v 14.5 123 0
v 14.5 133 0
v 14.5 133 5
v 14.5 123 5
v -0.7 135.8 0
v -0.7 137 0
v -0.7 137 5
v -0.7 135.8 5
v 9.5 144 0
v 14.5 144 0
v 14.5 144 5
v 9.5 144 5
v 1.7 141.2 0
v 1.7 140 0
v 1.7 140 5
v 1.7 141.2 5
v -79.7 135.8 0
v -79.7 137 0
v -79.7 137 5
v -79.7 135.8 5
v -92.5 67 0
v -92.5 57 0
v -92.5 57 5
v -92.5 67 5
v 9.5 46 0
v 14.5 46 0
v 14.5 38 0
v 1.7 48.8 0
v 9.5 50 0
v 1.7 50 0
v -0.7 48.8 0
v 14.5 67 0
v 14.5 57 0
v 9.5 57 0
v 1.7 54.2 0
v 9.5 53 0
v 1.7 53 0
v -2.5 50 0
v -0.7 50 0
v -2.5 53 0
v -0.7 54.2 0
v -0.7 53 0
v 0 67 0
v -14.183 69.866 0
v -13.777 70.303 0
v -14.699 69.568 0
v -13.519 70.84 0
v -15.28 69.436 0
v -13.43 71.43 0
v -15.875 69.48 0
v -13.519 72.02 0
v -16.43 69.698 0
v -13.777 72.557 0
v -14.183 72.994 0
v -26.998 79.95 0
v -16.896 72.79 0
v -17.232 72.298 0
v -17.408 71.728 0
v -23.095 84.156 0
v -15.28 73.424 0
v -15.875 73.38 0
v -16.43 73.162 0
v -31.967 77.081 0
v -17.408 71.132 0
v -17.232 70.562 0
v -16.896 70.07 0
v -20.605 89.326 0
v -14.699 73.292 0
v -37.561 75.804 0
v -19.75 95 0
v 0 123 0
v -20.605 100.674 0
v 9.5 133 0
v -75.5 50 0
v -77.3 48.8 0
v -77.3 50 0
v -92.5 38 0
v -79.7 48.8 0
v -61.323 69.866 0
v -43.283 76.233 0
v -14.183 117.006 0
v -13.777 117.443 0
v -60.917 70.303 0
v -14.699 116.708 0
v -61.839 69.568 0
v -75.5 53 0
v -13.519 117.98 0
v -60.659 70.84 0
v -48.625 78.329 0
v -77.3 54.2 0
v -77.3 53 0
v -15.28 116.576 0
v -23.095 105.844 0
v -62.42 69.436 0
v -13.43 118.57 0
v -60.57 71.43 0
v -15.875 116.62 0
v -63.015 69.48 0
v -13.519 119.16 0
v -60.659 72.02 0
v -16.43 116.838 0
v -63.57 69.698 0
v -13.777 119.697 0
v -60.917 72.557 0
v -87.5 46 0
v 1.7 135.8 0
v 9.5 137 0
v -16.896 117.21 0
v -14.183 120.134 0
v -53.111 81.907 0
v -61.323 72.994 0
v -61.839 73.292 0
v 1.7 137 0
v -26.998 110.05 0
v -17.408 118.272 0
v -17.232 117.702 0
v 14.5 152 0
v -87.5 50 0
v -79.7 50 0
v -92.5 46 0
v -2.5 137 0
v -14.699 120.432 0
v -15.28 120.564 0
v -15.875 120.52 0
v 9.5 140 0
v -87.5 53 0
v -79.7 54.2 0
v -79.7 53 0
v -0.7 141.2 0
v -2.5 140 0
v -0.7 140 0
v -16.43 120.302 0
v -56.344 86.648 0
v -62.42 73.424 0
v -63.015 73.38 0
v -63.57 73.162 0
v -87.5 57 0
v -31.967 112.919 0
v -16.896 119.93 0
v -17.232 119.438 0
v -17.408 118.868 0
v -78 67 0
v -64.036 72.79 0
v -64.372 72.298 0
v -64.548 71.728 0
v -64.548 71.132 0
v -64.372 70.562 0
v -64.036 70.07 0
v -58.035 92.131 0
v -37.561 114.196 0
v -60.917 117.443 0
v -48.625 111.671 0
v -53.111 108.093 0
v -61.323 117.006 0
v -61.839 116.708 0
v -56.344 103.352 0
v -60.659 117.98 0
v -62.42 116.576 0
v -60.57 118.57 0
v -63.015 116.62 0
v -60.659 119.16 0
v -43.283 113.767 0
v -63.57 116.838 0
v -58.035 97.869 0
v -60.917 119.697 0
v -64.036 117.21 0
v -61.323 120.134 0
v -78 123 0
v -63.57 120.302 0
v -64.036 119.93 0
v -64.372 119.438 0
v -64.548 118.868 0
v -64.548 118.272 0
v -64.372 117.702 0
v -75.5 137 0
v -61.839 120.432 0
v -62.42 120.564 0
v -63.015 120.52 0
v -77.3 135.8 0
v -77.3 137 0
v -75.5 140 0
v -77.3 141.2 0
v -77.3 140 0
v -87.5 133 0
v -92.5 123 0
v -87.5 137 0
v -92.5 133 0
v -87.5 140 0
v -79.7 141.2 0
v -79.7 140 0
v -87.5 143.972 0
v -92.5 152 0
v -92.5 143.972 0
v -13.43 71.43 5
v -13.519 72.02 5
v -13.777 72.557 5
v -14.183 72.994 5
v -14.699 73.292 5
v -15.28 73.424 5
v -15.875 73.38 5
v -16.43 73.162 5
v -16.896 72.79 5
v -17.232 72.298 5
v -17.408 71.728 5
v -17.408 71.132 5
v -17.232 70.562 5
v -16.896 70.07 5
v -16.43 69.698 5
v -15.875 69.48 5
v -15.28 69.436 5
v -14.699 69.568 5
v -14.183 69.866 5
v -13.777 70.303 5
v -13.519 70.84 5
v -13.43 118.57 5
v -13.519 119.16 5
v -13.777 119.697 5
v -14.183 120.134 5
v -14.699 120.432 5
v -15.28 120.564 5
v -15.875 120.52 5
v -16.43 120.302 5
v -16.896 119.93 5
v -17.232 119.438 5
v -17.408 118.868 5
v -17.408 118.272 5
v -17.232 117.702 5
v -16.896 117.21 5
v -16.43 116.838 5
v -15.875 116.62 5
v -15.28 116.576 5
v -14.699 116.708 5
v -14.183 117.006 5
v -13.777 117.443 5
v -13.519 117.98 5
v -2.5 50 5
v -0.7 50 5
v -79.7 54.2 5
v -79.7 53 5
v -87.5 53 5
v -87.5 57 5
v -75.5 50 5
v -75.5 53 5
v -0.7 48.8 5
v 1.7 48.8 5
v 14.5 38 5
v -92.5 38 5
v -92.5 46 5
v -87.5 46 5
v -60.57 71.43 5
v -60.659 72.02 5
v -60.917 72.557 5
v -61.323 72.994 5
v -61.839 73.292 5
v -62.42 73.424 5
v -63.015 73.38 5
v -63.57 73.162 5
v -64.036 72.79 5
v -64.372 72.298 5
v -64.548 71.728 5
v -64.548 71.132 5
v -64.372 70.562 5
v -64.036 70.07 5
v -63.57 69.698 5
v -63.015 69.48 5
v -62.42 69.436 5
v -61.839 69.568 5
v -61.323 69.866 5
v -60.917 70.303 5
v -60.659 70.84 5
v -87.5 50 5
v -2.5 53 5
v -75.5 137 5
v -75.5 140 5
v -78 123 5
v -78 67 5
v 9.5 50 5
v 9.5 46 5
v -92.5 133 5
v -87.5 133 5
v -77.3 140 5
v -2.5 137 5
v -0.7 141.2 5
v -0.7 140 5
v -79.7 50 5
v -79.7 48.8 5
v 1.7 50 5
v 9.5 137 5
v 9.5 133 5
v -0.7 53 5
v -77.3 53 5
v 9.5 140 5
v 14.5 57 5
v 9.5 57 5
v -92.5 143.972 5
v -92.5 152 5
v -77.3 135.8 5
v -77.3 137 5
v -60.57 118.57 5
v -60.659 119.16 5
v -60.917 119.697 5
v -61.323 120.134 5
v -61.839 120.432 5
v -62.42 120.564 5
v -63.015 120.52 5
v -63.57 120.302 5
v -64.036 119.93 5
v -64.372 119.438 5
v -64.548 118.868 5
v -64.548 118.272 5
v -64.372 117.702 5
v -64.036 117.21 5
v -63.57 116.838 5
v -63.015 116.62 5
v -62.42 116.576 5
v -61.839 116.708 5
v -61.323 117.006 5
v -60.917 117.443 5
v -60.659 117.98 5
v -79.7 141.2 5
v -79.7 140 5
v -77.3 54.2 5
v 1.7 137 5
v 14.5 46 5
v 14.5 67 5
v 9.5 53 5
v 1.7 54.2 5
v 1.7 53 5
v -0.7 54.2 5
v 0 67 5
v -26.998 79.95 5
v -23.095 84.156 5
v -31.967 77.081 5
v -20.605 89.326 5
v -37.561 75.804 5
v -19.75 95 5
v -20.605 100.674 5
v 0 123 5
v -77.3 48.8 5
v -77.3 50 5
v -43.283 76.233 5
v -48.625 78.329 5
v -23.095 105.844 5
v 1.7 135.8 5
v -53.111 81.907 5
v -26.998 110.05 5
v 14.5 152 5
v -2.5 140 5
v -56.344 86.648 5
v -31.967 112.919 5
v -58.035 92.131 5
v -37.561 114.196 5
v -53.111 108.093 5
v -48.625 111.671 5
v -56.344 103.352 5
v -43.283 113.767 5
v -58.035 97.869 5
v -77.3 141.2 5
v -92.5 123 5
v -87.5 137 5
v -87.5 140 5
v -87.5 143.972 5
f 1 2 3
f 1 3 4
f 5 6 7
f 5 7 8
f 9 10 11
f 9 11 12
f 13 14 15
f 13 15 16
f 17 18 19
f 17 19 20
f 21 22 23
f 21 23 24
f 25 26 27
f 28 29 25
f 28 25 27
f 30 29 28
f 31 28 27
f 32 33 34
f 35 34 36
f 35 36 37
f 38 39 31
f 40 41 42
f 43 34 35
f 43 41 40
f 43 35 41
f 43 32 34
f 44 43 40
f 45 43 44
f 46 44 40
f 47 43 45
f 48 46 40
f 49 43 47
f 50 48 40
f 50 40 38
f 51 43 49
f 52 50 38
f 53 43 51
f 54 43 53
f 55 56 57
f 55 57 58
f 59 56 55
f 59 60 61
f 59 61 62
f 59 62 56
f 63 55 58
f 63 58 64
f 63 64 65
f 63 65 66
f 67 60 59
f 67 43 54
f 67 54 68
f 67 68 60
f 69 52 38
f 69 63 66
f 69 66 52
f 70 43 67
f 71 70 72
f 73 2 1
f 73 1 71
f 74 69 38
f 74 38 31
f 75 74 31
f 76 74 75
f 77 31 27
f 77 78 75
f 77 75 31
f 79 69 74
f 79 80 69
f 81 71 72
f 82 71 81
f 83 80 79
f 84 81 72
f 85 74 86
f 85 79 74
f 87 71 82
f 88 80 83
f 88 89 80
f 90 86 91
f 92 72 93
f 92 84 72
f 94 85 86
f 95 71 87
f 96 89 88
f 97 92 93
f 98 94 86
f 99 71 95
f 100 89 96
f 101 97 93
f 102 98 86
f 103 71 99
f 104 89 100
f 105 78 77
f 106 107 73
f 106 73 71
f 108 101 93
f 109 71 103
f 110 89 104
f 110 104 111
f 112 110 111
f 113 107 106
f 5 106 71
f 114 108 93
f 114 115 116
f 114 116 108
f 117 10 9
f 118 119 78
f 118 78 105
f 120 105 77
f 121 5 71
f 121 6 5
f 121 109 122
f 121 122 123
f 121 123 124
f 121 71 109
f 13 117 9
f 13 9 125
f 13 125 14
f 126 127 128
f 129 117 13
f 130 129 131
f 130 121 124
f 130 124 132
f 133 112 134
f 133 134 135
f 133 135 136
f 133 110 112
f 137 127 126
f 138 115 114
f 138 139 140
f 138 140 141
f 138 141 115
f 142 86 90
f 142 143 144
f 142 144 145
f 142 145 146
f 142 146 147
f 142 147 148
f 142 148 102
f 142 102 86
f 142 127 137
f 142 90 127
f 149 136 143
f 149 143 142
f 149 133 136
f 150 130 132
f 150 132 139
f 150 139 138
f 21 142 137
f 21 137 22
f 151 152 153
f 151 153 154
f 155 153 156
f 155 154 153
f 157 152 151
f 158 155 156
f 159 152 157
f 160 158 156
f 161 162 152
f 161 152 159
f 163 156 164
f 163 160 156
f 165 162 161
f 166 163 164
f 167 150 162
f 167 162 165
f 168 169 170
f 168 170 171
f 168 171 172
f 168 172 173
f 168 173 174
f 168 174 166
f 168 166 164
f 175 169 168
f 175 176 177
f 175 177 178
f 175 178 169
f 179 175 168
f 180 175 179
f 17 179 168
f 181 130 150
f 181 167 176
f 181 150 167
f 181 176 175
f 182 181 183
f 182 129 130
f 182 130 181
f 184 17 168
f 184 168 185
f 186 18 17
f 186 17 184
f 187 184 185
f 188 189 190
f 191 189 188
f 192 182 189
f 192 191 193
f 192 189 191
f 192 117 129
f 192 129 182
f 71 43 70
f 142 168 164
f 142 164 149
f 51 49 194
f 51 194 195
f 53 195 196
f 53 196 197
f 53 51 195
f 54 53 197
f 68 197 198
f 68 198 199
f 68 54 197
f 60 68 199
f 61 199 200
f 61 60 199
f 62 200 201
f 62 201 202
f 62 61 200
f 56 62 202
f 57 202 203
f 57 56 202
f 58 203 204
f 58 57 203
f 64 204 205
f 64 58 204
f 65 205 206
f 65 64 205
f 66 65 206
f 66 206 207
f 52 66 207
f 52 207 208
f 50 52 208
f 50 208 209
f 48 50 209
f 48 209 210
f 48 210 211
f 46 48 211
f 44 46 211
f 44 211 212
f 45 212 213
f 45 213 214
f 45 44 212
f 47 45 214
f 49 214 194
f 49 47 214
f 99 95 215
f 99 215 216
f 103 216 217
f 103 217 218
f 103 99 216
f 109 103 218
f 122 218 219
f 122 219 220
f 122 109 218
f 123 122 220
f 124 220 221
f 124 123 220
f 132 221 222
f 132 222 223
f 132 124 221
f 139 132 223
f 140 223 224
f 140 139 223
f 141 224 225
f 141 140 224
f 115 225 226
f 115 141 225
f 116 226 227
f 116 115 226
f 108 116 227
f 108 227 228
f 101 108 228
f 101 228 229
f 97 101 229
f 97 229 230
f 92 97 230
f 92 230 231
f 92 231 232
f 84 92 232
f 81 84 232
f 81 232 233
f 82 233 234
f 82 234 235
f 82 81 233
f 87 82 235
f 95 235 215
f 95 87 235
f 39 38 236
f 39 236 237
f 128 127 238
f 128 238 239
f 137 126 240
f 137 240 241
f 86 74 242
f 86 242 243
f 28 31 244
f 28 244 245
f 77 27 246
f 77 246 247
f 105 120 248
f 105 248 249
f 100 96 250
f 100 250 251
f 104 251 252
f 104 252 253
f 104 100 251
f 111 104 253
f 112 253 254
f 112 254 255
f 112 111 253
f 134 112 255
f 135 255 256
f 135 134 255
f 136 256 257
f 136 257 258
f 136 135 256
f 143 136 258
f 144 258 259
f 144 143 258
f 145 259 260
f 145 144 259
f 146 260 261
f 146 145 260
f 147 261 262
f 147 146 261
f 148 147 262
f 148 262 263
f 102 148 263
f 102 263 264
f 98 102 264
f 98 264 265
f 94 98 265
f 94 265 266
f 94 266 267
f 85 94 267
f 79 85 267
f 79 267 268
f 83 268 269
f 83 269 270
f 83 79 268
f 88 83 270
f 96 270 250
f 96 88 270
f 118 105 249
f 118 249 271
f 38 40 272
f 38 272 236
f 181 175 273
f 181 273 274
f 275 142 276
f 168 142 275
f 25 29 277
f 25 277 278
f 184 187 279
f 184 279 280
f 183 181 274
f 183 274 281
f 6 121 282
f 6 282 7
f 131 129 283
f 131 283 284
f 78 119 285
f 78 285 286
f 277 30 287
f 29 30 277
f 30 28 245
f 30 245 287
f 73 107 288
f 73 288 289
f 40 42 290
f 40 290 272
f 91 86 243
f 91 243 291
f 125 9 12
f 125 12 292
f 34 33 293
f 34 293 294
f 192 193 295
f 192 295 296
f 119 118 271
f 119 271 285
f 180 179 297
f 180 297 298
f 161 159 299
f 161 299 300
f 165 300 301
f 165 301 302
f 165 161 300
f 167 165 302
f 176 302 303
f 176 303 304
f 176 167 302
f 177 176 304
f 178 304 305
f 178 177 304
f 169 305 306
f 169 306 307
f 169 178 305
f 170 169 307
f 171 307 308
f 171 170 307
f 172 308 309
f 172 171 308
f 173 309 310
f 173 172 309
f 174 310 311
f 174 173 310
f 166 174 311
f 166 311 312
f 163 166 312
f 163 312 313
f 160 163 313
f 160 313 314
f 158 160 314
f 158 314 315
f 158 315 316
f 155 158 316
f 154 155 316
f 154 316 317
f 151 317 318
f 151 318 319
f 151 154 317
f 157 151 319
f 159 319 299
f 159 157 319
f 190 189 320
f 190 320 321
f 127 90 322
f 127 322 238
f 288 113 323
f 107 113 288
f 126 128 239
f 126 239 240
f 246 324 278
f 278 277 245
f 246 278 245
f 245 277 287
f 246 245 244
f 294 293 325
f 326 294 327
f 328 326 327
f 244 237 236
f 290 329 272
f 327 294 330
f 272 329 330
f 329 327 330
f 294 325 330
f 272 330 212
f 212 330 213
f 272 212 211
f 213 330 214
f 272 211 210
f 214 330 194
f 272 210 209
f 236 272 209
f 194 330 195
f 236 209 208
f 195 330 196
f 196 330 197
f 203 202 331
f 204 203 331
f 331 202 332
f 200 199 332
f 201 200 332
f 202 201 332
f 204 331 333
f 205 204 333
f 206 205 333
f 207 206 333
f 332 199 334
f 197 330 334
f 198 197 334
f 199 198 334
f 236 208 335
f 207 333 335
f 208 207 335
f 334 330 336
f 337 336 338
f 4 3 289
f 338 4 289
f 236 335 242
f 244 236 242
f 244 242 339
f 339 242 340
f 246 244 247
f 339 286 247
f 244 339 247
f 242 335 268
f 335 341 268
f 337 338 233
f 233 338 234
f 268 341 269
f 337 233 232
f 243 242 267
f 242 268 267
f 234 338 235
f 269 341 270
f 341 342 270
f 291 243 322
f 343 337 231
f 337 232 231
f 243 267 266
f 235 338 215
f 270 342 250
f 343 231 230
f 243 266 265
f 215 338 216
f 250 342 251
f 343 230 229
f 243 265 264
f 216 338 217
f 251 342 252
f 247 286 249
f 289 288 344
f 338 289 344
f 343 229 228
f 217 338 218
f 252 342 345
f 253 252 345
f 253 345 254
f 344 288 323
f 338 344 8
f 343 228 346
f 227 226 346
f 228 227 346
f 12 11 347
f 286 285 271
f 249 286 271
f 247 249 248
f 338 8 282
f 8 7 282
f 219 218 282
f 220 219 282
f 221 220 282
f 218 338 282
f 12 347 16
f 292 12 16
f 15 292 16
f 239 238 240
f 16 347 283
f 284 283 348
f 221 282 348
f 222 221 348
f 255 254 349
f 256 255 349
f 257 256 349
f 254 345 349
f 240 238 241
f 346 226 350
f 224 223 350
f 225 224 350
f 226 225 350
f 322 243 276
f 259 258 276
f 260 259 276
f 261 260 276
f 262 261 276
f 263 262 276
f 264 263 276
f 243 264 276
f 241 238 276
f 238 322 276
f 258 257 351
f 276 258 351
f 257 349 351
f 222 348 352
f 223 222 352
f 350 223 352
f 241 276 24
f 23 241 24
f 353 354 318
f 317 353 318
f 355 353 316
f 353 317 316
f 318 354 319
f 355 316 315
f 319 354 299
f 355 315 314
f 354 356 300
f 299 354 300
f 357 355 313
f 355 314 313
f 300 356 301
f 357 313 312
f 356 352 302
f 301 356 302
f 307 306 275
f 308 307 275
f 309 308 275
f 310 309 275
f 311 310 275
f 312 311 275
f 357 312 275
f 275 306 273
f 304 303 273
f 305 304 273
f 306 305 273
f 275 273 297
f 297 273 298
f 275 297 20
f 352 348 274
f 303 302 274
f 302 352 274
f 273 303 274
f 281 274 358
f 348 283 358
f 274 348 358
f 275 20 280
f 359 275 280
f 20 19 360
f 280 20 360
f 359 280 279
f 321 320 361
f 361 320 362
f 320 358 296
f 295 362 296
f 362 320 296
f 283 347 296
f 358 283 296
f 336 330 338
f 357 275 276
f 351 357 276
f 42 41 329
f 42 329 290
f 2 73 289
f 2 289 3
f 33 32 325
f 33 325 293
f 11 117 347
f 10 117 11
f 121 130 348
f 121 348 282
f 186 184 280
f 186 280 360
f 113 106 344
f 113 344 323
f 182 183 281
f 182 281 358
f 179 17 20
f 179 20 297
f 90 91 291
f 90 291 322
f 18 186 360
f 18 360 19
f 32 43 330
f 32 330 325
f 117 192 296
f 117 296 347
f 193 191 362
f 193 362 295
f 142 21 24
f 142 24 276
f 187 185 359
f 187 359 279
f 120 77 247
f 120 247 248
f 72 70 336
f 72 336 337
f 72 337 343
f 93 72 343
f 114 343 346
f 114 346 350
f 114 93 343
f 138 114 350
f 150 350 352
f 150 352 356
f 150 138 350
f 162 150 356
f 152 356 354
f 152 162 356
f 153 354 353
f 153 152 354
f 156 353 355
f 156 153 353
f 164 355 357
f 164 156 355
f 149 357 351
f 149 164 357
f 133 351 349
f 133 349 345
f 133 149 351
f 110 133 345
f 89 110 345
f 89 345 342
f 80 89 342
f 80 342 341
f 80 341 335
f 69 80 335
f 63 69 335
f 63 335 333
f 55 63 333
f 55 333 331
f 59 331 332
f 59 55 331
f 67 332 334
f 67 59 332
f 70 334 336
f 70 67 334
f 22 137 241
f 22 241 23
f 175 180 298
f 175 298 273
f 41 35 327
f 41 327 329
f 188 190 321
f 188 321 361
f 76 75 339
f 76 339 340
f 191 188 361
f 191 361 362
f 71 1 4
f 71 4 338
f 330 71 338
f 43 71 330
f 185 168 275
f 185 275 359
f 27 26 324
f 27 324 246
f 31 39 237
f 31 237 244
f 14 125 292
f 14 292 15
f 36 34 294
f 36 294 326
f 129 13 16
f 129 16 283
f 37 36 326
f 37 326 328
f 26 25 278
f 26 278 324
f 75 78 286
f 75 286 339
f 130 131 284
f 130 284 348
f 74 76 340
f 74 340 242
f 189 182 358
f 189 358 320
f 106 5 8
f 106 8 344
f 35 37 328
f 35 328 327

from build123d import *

# Parameters (mm, degrees)
MODEL_R                  = 2
MODEL_R_2                = 19.25
RESSALTO_EXTRUS_O1_DEPTH = 5


with BuildPart() as part:
    # Model → Ressalto-extrusão1 (new body)
    with BuildSketch(Plane.XY):
        Polygon((-87.499906276, 136.999930927), (-79.699992019, 136.999930927), (-79.699992019, 135.799931225), (-77.299992019, 135.799931225), (-77.299992019, 136.999930927), (-75.499992019, 136.999930927), (-75.499992019, 139.999946471), (-77.299992019, 139.999946471), (-77.299992019, 141.199946173), (-79.699992019, 141.199946173), (-79.699992019, 139.999946471), (-87.499906276, 139.999946471), (-87.499906276, 143.971527937), (-92.499906103, 143.971527937), (-92.499906103, 151.99992515), (14.500094446, 151.99992515), (14.500094446, 143.999926549), (9.500094619, 143.999926549), (9.500094619, 139.999946471), (1.700033295, 139.999946471), (1.700033295, 141.199946173), (-0.699966705, 141.199946173), (-0.699966705, 139.999946471), (-2.499966705, 139.999946471), (-2.499966705, 136.999930927), (-0.699966705, 136.999930927), (-0.699966705, 135.799931225), (1.700033295, 135.799931225), (1.700033295, 136.999930927), (9.500094619, 136.999930927), (9.500094619, 133.000010759), (14.500094446, 133.000010759), (14.500094446, 123.000010744), (3.1755e-05, 123.000010744), (3.1755e-05, 66.999892416), (14.500094446, 66.999892416), (14.500094446, 56.999892401), (9.500094619, 56.999892401), (9.500094619, 52.999972233), (1.700033295, 52.999972233), (1.700033295, 54.199971935), (-0.699966705, 54.199971935), (-0.699966705, 52.999972233), (-2.499966705, 52.999972233), (-2.499966705, 50.000008094), (-0.699966705, 50.000008094), (-0.699966705, 48.799928912), (1.700033295, 48.799928912), (1.700033295, 50.000008094), (9.500094619, 50.000008094), (9.500094619, 46.000008447), (14.500094446, 46.000008447), (14.500094446, 38.000009846), (-92.499906103, 38.000009846), (-92.499906103, 46.000008447), (-87.499906276, 46.000008447), (-87.499906276, 49.999928614), (-79.699992019, 49.999928614), (-79.699992019, 48.799928912), (-77.299992019, 48.799928912), (-77.299992019, 49.999928614), (-75.499992019, 49.999928614), (-75.499992019, 52.999972233), (-77.299992019, 52.999972233), (-77.299992019, 54.199971935), (-79.699992019, 54.199971935), (-79.699992019, 52.999972233), (-87.499906276, 52.999972233), (-87.499906276, 56.999892401), (-92.500404317, 56.999892401), (-92.500404317, 66.999892416), (-78.000001989, 66.999892416), (-78.000001989, 123.000010744), (-92.499906103, 123.000010744), (-92.499906103, 133.000010759), (-87.499906276, 133.000010759), align=None)
        with Locations((-62.569893888, 118.570002461)):
            Circle(MODEL_R, mode=Mode.SUBTRACT)
        with Locations((-15.429893888, 118.570002461)):
            Circle(MODEL_R, mode=Mode.SUBTRACT)
        with Locations((-62.569893888, 71.430002461)):
            Circle(MODEL_R, mode=Mode.SUBTRACT)
        with Locations((-15.429893888, 71.430002461)):
            Circle(MODEL_R, mode=Mode.SUBTRACT)
        with Locations((-38.999893888, 95.000002461)):
            Circle(MODEL_R_2, mode=Mode.SUBTRACT)
    extrude(amount=RESSALTO_EXTRUS_O1_DEPTH)


solid = part.part
